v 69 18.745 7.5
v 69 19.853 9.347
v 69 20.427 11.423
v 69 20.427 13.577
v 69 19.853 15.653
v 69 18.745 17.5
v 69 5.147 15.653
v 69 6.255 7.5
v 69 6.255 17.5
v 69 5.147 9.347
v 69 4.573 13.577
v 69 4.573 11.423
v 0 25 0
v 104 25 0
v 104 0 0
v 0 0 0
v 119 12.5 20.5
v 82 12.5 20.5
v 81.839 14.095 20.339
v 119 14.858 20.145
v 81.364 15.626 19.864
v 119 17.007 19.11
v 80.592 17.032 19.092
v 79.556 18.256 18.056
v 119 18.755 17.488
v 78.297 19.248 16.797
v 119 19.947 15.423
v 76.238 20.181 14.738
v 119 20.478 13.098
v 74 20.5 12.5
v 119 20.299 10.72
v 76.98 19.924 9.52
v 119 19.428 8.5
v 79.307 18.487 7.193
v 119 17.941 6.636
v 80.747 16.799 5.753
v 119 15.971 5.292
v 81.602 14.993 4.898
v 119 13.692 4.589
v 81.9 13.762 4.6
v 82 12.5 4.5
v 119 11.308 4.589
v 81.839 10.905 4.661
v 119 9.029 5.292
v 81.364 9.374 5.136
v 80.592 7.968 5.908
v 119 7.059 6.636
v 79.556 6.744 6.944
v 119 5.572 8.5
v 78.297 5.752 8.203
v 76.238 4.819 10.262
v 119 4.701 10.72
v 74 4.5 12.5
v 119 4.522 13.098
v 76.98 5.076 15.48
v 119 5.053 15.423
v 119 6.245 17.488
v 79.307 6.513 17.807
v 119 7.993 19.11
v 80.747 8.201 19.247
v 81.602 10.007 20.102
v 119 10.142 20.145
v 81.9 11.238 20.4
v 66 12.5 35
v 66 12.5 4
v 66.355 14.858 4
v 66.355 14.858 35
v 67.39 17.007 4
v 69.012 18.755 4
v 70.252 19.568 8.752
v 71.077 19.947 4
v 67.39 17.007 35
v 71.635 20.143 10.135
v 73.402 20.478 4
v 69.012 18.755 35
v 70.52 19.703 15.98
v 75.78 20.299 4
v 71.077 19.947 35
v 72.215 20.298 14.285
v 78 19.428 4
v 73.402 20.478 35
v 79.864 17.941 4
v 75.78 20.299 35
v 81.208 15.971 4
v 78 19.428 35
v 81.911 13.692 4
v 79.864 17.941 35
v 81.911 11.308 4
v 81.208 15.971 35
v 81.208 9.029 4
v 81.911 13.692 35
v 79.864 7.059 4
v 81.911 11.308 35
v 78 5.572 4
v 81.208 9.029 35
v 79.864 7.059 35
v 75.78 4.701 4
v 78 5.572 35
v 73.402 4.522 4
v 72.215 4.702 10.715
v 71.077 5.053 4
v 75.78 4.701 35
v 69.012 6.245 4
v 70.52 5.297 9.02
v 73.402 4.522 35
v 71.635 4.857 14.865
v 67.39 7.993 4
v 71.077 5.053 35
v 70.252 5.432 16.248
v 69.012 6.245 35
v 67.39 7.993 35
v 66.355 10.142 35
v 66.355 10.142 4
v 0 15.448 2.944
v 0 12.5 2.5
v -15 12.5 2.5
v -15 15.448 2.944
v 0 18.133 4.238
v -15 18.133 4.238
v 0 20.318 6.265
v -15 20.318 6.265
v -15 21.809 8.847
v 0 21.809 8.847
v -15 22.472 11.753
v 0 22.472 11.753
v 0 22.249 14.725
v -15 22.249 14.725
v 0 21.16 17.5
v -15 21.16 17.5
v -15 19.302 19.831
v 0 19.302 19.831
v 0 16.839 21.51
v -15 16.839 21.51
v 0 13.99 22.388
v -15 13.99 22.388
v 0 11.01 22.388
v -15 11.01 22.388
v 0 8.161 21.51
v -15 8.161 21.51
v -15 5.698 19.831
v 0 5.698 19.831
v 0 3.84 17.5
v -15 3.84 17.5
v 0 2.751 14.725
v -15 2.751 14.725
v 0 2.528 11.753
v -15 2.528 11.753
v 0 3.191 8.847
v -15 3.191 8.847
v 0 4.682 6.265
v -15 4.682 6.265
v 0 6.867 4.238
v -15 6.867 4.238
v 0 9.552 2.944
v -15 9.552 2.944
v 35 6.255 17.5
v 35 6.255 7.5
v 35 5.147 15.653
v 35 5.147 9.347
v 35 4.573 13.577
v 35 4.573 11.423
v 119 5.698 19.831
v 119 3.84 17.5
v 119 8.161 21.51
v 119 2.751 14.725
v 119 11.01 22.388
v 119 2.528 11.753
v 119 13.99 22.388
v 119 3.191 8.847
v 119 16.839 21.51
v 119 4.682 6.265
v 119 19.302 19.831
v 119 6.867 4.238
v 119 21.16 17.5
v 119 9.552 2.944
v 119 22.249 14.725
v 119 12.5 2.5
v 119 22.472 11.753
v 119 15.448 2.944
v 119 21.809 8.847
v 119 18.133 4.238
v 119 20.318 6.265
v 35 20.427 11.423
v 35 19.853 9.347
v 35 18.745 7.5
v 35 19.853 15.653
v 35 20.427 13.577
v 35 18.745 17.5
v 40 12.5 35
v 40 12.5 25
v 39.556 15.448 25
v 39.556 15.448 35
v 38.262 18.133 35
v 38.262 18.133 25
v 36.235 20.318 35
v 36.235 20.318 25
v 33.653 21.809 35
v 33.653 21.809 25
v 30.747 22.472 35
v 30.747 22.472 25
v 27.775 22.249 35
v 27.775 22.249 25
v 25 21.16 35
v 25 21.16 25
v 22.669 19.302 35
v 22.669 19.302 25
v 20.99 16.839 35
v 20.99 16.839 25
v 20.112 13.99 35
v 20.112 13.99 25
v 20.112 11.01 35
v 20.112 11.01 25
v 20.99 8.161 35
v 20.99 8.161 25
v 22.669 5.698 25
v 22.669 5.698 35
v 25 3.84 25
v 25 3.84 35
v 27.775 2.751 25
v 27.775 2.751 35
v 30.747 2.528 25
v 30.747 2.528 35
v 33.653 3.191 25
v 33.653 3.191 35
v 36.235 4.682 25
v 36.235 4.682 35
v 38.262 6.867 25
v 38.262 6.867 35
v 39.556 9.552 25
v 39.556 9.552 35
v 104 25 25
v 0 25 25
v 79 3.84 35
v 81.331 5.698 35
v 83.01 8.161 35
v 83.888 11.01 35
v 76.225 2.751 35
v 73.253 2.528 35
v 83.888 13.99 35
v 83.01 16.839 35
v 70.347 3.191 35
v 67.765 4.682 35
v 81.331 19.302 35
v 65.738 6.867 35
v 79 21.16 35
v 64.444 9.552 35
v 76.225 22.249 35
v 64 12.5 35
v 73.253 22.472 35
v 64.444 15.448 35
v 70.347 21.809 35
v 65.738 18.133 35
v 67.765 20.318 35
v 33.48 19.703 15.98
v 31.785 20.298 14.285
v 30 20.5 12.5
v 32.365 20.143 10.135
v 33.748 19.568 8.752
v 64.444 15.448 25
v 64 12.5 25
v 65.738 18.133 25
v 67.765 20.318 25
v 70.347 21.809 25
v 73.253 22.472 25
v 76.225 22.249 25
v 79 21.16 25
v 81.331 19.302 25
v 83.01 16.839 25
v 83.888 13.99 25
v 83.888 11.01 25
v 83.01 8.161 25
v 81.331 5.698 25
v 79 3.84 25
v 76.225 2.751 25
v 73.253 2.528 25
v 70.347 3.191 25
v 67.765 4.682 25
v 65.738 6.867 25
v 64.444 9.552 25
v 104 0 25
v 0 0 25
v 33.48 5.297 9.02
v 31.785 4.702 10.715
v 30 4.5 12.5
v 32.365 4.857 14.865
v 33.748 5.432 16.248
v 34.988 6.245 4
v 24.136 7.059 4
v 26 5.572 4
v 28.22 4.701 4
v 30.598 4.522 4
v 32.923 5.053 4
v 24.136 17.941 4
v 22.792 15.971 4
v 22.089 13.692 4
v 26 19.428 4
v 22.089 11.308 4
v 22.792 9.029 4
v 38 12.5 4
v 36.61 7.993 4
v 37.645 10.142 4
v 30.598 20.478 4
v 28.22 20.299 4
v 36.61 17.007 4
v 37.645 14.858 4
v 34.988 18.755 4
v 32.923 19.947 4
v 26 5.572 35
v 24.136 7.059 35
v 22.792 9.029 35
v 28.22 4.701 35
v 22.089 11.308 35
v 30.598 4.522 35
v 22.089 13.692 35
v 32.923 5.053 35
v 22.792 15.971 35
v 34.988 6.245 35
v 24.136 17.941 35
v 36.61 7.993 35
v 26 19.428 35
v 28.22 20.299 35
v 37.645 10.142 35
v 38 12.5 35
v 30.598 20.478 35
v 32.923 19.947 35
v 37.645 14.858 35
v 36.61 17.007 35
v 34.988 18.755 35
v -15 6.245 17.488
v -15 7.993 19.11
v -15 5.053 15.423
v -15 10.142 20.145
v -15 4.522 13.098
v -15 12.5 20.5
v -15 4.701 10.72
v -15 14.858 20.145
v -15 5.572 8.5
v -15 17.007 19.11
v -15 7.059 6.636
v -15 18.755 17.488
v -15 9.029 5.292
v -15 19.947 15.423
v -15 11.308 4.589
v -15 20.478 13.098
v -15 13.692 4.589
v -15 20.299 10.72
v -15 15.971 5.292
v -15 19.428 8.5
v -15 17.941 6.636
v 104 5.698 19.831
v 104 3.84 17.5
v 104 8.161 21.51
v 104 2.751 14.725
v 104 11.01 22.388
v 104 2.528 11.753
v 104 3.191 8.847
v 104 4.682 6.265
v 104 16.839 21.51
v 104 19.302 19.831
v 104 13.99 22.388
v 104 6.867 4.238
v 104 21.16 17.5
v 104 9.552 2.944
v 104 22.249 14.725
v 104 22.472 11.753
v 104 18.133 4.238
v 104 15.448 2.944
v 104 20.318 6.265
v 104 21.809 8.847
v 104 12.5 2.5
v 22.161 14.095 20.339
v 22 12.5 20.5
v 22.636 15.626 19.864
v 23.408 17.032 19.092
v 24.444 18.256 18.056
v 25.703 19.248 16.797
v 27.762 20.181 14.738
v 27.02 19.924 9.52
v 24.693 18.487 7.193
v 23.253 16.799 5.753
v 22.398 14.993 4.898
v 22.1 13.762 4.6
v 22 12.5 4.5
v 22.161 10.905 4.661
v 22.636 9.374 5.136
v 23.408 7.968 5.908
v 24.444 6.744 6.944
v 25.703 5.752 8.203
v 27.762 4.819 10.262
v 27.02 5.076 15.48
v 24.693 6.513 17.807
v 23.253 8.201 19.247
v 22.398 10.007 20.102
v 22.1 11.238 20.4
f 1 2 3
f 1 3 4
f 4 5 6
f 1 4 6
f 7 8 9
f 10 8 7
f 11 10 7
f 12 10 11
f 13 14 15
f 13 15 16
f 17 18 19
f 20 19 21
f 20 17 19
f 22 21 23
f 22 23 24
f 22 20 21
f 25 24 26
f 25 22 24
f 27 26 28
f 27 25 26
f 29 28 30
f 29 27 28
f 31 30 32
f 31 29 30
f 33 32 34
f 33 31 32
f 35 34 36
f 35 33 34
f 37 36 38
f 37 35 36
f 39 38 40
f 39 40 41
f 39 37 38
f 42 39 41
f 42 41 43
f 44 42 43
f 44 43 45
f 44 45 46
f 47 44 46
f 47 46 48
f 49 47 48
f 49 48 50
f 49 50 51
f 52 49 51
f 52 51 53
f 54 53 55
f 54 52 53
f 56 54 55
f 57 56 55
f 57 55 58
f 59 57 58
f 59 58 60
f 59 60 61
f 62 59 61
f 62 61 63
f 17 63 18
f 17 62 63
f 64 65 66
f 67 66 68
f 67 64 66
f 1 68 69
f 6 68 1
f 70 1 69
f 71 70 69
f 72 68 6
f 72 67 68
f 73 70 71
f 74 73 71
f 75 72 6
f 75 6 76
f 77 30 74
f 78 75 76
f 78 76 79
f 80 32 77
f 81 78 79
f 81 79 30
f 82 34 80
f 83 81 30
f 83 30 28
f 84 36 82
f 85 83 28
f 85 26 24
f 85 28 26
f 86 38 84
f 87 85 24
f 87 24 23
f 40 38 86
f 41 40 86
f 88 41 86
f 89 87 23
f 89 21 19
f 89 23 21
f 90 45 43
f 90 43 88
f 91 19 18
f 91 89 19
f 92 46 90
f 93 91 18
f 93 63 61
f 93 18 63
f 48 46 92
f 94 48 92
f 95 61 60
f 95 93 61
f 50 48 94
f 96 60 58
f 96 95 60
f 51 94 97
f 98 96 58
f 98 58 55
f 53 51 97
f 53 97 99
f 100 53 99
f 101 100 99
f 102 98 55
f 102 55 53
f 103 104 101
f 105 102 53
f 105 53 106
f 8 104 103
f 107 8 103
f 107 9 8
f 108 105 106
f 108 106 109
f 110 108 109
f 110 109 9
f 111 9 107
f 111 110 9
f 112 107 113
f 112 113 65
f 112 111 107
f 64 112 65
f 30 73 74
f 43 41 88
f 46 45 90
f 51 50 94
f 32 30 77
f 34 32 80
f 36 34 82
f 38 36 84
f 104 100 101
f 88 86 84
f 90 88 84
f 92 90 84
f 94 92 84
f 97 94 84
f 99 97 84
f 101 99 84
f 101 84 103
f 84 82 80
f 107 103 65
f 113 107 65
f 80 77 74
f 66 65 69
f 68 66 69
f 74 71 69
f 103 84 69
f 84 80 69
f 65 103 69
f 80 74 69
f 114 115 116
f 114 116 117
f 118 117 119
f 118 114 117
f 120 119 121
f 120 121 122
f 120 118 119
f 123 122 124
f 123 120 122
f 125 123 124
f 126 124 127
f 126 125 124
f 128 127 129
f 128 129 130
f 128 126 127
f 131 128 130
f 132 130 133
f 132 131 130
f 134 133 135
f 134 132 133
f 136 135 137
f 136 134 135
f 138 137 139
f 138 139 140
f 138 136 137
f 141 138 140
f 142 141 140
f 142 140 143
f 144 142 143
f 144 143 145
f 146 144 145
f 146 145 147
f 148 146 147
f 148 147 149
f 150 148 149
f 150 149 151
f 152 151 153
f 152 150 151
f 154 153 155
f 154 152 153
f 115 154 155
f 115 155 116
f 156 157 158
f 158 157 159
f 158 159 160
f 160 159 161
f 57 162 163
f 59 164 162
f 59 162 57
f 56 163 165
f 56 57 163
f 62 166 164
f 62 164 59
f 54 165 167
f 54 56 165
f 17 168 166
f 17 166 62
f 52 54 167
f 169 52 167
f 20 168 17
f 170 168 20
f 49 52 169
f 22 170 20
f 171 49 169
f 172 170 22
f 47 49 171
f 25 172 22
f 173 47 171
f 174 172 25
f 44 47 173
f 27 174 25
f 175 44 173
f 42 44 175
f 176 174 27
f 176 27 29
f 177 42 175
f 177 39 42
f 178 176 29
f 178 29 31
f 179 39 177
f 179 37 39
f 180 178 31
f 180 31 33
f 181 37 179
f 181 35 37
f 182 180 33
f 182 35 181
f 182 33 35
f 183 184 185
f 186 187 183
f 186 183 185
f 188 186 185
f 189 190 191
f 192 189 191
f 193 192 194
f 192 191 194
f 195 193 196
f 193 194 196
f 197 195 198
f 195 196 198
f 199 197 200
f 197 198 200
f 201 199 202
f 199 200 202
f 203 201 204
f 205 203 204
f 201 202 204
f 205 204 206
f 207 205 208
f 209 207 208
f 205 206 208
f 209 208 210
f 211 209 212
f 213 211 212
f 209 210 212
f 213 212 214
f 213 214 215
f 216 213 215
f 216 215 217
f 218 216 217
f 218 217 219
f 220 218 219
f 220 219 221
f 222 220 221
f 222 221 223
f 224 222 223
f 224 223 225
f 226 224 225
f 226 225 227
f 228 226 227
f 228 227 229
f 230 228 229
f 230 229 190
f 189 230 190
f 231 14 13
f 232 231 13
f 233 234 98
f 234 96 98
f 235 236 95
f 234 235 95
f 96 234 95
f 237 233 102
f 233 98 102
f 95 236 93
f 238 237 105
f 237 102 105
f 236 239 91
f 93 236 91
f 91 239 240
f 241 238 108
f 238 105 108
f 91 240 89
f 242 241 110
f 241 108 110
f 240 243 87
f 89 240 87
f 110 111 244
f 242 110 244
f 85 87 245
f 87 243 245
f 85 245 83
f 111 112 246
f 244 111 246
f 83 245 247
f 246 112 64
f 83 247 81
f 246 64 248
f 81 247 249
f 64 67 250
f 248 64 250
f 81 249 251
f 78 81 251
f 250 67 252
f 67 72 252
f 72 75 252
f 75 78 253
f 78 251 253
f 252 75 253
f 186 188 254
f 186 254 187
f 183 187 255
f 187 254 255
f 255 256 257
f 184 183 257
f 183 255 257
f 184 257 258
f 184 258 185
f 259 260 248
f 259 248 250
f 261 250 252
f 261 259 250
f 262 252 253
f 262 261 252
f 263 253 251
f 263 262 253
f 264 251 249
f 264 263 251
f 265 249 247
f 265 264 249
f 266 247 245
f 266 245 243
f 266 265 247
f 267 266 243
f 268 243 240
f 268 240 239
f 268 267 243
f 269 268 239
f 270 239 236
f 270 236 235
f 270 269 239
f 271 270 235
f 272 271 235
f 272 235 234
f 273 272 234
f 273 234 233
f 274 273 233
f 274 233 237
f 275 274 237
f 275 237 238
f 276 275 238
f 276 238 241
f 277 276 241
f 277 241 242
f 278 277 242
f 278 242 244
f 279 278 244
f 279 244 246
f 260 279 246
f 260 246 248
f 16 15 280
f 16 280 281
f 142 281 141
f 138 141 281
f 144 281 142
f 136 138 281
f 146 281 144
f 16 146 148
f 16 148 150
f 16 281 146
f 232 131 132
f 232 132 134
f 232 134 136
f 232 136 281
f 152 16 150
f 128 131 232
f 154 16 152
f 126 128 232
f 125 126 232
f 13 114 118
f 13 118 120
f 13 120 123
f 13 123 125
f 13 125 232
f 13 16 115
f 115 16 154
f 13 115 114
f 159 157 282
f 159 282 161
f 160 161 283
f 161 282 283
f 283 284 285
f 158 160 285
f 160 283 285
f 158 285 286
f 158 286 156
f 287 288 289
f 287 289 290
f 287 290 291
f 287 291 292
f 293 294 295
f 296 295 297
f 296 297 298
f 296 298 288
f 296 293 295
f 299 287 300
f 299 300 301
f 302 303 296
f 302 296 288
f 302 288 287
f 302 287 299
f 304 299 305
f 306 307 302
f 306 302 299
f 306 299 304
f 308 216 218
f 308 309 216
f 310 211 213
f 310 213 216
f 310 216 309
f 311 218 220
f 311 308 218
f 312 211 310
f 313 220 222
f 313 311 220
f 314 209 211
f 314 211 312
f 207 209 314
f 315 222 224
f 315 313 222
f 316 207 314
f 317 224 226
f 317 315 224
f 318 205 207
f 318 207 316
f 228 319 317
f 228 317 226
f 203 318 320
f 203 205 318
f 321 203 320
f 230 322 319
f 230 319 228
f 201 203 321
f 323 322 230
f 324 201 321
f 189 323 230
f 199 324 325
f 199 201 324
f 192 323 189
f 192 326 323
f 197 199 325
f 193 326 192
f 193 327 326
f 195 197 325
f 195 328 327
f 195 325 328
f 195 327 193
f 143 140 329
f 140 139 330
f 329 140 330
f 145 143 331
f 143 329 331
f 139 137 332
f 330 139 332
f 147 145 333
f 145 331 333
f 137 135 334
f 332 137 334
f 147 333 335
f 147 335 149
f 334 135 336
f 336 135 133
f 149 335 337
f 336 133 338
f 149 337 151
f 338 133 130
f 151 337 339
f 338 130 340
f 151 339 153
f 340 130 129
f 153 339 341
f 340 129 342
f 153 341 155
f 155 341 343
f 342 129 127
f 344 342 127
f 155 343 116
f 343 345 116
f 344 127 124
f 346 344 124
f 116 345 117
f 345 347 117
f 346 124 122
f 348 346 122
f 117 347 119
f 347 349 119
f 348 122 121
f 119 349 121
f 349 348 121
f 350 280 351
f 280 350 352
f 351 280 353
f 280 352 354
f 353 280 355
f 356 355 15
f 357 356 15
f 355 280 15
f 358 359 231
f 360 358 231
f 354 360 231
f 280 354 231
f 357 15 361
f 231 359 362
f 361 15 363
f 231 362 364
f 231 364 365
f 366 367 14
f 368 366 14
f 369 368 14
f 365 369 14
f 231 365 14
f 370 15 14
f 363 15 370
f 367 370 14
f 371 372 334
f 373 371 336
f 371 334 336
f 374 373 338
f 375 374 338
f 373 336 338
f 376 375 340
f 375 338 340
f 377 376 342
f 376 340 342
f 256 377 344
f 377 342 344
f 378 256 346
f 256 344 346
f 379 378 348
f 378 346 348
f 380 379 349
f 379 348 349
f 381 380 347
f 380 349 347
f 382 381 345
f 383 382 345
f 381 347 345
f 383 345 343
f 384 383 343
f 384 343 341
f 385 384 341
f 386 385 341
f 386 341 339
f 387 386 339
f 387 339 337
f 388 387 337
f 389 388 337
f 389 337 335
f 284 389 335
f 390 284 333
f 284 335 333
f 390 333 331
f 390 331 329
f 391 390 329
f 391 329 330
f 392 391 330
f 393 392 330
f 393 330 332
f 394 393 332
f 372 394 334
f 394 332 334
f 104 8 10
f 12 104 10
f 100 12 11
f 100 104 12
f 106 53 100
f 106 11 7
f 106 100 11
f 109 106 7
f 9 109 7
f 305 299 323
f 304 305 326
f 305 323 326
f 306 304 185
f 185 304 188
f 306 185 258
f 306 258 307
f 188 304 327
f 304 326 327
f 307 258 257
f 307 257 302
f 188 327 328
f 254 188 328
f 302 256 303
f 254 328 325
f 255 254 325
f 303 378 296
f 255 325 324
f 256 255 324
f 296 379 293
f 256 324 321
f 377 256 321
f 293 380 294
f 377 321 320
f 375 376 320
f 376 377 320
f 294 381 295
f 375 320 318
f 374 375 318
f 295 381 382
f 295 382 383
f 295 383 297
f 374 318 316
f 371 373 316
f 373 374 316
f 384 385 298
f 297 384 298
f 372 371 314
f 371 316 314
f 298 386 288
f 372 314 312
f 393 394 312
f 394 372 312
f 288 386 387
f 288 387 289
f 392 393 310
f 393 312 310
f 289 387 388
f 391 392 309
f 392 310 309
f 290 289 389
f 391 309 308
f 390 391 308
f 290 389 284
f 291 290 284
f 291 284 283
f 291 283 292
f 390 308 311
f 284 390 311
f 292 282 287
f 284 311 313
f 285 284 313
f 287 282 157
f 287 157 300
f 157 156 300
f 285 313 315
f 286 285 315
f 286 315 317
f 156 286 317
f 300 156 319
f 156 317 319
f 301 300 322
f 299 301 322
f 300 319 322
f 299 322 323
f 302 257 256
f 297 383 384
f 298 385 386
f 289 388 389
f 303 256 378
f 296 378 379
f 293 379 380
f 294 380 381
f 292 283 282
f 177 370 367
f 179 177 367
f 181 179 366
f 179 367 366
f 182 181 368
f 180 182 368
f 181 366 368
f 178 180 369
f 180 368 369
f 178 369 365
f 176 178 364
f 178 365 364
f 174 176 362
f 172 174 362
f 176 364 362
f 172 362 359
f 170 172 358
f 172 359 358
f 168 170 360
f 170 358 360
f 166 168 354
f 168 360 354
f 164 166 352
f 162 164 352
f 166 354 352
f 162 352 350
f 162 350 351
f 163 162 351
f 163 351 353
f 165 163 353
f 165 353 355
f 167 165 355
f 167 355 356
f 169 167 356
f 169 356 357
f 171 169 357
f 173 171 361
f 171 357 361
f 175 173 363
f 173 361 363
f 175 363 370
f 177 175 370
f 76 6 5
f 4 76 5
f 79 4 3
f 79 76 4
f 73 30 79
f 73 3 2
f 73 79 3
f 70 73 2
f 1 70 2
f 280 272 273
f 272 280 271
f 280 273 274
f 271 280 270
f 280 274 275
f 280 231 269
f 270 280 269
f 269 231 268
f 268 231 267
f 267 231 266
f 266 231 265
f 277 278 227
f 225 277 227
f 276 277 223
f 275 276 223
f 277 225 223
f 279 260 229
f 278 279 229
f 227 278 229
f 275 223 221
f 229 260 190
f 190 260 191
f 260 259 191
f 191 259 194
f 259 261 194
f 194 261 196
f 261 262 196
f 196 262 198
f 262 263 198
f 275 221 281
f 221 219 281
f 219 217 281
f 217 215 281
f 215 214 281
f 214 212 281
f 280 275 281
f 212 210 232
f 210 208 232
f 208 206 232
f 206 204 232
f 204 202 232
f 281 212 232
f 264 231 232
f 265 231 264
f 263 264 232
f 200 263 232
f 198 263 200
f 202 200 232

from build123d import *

# Parameters (mm, degrees)
SZKIC1_W                    = 52
SZKIC1_H                    = 25
DODANIE_WYCI_GNI_CIE1_DEPTH = 25
SZKIC1_3_R                  = 10
DODANIE_WYCI_GNI_CIE2_DEPTH = 35
SZKIC2_R                    = 10
DODANIE_WYCI_GNI_CIE3_DEPTH = 15
SZKIC3_R                    = 8
WYTNIJ_WYCI_GNI_CIE1_DEPTH  = 50
SZKIC4_R                    = 8
WYTNIJ_WYCI_GNI_CIE2_DEPTH  = 31


with BuildPart() as part:
    # Szkic1 → Dodanie-wyci_gni_cie1 (new body)
    with BuildSketch(Plane.XY):
        with Locations((26, 12.5)):
            Rectangle(SZKIC1_W, SZKIC1_H)
    extrude(amount=DODANIE_WYCI_GNI_CIE1_DEPTH)

    # Szkic1_3 → Dodanie-wyci_gni_cie2 (add)
    with BuildSketch(Plane.XY):
        with Locations((30, 12.5)):
            Circle(SZKIC1_3_R)
    extrude(amount=DODANIE_WYCI_GNI_CIE2_DEPTH)

    # Szkic2 → Dodanie-wyci_gni_cie3 (add)
    with BuildSketch(Plane(origin=(0, 0, 0), x_dir=(0, 0, -1), z_dir=(1, 0, 0))):
        with Locations((-12.5, 12.5)):
            Circle(SZKIC2_R)
    extrude(amount=-DODANIE_WYCI_GNI_CIE3_DEPTH)

    # Szkic3 → Wytnij-wyci_gni_cie1 (cut)
    with BuildSketch(Plane.ZY.offset(15)):
        with Locations((12.5, 12.5)):
            Circle(SZKIC3_R)
    extrude(amount=-WYTNIJ_WYCI_GNI_CIE1_DEPTH, mode=Mode.SUBTRACT)

    # Szkic4 → Wytnij-wyci_gni_cie2 (cut)
    with BuildSketch(Plane.XY.offset(35)):
        with Locations((30, 12.5)):
            Circle(SZKIC4_R)
    extrude(amount=-WYTNIJ_WYCI_GNI_CIE2_DEPTH, mode=Mode.SUBTRACT)

    # Lustro1: part across plane


with BuildPart() as part_1:
    add(part.part)
    add(part.part.mirror(Plane(origin=(52, 0, 25), x_dir=(0, 0, 1), z_dir=(1, 0, 0))))


solid = part_1.part
